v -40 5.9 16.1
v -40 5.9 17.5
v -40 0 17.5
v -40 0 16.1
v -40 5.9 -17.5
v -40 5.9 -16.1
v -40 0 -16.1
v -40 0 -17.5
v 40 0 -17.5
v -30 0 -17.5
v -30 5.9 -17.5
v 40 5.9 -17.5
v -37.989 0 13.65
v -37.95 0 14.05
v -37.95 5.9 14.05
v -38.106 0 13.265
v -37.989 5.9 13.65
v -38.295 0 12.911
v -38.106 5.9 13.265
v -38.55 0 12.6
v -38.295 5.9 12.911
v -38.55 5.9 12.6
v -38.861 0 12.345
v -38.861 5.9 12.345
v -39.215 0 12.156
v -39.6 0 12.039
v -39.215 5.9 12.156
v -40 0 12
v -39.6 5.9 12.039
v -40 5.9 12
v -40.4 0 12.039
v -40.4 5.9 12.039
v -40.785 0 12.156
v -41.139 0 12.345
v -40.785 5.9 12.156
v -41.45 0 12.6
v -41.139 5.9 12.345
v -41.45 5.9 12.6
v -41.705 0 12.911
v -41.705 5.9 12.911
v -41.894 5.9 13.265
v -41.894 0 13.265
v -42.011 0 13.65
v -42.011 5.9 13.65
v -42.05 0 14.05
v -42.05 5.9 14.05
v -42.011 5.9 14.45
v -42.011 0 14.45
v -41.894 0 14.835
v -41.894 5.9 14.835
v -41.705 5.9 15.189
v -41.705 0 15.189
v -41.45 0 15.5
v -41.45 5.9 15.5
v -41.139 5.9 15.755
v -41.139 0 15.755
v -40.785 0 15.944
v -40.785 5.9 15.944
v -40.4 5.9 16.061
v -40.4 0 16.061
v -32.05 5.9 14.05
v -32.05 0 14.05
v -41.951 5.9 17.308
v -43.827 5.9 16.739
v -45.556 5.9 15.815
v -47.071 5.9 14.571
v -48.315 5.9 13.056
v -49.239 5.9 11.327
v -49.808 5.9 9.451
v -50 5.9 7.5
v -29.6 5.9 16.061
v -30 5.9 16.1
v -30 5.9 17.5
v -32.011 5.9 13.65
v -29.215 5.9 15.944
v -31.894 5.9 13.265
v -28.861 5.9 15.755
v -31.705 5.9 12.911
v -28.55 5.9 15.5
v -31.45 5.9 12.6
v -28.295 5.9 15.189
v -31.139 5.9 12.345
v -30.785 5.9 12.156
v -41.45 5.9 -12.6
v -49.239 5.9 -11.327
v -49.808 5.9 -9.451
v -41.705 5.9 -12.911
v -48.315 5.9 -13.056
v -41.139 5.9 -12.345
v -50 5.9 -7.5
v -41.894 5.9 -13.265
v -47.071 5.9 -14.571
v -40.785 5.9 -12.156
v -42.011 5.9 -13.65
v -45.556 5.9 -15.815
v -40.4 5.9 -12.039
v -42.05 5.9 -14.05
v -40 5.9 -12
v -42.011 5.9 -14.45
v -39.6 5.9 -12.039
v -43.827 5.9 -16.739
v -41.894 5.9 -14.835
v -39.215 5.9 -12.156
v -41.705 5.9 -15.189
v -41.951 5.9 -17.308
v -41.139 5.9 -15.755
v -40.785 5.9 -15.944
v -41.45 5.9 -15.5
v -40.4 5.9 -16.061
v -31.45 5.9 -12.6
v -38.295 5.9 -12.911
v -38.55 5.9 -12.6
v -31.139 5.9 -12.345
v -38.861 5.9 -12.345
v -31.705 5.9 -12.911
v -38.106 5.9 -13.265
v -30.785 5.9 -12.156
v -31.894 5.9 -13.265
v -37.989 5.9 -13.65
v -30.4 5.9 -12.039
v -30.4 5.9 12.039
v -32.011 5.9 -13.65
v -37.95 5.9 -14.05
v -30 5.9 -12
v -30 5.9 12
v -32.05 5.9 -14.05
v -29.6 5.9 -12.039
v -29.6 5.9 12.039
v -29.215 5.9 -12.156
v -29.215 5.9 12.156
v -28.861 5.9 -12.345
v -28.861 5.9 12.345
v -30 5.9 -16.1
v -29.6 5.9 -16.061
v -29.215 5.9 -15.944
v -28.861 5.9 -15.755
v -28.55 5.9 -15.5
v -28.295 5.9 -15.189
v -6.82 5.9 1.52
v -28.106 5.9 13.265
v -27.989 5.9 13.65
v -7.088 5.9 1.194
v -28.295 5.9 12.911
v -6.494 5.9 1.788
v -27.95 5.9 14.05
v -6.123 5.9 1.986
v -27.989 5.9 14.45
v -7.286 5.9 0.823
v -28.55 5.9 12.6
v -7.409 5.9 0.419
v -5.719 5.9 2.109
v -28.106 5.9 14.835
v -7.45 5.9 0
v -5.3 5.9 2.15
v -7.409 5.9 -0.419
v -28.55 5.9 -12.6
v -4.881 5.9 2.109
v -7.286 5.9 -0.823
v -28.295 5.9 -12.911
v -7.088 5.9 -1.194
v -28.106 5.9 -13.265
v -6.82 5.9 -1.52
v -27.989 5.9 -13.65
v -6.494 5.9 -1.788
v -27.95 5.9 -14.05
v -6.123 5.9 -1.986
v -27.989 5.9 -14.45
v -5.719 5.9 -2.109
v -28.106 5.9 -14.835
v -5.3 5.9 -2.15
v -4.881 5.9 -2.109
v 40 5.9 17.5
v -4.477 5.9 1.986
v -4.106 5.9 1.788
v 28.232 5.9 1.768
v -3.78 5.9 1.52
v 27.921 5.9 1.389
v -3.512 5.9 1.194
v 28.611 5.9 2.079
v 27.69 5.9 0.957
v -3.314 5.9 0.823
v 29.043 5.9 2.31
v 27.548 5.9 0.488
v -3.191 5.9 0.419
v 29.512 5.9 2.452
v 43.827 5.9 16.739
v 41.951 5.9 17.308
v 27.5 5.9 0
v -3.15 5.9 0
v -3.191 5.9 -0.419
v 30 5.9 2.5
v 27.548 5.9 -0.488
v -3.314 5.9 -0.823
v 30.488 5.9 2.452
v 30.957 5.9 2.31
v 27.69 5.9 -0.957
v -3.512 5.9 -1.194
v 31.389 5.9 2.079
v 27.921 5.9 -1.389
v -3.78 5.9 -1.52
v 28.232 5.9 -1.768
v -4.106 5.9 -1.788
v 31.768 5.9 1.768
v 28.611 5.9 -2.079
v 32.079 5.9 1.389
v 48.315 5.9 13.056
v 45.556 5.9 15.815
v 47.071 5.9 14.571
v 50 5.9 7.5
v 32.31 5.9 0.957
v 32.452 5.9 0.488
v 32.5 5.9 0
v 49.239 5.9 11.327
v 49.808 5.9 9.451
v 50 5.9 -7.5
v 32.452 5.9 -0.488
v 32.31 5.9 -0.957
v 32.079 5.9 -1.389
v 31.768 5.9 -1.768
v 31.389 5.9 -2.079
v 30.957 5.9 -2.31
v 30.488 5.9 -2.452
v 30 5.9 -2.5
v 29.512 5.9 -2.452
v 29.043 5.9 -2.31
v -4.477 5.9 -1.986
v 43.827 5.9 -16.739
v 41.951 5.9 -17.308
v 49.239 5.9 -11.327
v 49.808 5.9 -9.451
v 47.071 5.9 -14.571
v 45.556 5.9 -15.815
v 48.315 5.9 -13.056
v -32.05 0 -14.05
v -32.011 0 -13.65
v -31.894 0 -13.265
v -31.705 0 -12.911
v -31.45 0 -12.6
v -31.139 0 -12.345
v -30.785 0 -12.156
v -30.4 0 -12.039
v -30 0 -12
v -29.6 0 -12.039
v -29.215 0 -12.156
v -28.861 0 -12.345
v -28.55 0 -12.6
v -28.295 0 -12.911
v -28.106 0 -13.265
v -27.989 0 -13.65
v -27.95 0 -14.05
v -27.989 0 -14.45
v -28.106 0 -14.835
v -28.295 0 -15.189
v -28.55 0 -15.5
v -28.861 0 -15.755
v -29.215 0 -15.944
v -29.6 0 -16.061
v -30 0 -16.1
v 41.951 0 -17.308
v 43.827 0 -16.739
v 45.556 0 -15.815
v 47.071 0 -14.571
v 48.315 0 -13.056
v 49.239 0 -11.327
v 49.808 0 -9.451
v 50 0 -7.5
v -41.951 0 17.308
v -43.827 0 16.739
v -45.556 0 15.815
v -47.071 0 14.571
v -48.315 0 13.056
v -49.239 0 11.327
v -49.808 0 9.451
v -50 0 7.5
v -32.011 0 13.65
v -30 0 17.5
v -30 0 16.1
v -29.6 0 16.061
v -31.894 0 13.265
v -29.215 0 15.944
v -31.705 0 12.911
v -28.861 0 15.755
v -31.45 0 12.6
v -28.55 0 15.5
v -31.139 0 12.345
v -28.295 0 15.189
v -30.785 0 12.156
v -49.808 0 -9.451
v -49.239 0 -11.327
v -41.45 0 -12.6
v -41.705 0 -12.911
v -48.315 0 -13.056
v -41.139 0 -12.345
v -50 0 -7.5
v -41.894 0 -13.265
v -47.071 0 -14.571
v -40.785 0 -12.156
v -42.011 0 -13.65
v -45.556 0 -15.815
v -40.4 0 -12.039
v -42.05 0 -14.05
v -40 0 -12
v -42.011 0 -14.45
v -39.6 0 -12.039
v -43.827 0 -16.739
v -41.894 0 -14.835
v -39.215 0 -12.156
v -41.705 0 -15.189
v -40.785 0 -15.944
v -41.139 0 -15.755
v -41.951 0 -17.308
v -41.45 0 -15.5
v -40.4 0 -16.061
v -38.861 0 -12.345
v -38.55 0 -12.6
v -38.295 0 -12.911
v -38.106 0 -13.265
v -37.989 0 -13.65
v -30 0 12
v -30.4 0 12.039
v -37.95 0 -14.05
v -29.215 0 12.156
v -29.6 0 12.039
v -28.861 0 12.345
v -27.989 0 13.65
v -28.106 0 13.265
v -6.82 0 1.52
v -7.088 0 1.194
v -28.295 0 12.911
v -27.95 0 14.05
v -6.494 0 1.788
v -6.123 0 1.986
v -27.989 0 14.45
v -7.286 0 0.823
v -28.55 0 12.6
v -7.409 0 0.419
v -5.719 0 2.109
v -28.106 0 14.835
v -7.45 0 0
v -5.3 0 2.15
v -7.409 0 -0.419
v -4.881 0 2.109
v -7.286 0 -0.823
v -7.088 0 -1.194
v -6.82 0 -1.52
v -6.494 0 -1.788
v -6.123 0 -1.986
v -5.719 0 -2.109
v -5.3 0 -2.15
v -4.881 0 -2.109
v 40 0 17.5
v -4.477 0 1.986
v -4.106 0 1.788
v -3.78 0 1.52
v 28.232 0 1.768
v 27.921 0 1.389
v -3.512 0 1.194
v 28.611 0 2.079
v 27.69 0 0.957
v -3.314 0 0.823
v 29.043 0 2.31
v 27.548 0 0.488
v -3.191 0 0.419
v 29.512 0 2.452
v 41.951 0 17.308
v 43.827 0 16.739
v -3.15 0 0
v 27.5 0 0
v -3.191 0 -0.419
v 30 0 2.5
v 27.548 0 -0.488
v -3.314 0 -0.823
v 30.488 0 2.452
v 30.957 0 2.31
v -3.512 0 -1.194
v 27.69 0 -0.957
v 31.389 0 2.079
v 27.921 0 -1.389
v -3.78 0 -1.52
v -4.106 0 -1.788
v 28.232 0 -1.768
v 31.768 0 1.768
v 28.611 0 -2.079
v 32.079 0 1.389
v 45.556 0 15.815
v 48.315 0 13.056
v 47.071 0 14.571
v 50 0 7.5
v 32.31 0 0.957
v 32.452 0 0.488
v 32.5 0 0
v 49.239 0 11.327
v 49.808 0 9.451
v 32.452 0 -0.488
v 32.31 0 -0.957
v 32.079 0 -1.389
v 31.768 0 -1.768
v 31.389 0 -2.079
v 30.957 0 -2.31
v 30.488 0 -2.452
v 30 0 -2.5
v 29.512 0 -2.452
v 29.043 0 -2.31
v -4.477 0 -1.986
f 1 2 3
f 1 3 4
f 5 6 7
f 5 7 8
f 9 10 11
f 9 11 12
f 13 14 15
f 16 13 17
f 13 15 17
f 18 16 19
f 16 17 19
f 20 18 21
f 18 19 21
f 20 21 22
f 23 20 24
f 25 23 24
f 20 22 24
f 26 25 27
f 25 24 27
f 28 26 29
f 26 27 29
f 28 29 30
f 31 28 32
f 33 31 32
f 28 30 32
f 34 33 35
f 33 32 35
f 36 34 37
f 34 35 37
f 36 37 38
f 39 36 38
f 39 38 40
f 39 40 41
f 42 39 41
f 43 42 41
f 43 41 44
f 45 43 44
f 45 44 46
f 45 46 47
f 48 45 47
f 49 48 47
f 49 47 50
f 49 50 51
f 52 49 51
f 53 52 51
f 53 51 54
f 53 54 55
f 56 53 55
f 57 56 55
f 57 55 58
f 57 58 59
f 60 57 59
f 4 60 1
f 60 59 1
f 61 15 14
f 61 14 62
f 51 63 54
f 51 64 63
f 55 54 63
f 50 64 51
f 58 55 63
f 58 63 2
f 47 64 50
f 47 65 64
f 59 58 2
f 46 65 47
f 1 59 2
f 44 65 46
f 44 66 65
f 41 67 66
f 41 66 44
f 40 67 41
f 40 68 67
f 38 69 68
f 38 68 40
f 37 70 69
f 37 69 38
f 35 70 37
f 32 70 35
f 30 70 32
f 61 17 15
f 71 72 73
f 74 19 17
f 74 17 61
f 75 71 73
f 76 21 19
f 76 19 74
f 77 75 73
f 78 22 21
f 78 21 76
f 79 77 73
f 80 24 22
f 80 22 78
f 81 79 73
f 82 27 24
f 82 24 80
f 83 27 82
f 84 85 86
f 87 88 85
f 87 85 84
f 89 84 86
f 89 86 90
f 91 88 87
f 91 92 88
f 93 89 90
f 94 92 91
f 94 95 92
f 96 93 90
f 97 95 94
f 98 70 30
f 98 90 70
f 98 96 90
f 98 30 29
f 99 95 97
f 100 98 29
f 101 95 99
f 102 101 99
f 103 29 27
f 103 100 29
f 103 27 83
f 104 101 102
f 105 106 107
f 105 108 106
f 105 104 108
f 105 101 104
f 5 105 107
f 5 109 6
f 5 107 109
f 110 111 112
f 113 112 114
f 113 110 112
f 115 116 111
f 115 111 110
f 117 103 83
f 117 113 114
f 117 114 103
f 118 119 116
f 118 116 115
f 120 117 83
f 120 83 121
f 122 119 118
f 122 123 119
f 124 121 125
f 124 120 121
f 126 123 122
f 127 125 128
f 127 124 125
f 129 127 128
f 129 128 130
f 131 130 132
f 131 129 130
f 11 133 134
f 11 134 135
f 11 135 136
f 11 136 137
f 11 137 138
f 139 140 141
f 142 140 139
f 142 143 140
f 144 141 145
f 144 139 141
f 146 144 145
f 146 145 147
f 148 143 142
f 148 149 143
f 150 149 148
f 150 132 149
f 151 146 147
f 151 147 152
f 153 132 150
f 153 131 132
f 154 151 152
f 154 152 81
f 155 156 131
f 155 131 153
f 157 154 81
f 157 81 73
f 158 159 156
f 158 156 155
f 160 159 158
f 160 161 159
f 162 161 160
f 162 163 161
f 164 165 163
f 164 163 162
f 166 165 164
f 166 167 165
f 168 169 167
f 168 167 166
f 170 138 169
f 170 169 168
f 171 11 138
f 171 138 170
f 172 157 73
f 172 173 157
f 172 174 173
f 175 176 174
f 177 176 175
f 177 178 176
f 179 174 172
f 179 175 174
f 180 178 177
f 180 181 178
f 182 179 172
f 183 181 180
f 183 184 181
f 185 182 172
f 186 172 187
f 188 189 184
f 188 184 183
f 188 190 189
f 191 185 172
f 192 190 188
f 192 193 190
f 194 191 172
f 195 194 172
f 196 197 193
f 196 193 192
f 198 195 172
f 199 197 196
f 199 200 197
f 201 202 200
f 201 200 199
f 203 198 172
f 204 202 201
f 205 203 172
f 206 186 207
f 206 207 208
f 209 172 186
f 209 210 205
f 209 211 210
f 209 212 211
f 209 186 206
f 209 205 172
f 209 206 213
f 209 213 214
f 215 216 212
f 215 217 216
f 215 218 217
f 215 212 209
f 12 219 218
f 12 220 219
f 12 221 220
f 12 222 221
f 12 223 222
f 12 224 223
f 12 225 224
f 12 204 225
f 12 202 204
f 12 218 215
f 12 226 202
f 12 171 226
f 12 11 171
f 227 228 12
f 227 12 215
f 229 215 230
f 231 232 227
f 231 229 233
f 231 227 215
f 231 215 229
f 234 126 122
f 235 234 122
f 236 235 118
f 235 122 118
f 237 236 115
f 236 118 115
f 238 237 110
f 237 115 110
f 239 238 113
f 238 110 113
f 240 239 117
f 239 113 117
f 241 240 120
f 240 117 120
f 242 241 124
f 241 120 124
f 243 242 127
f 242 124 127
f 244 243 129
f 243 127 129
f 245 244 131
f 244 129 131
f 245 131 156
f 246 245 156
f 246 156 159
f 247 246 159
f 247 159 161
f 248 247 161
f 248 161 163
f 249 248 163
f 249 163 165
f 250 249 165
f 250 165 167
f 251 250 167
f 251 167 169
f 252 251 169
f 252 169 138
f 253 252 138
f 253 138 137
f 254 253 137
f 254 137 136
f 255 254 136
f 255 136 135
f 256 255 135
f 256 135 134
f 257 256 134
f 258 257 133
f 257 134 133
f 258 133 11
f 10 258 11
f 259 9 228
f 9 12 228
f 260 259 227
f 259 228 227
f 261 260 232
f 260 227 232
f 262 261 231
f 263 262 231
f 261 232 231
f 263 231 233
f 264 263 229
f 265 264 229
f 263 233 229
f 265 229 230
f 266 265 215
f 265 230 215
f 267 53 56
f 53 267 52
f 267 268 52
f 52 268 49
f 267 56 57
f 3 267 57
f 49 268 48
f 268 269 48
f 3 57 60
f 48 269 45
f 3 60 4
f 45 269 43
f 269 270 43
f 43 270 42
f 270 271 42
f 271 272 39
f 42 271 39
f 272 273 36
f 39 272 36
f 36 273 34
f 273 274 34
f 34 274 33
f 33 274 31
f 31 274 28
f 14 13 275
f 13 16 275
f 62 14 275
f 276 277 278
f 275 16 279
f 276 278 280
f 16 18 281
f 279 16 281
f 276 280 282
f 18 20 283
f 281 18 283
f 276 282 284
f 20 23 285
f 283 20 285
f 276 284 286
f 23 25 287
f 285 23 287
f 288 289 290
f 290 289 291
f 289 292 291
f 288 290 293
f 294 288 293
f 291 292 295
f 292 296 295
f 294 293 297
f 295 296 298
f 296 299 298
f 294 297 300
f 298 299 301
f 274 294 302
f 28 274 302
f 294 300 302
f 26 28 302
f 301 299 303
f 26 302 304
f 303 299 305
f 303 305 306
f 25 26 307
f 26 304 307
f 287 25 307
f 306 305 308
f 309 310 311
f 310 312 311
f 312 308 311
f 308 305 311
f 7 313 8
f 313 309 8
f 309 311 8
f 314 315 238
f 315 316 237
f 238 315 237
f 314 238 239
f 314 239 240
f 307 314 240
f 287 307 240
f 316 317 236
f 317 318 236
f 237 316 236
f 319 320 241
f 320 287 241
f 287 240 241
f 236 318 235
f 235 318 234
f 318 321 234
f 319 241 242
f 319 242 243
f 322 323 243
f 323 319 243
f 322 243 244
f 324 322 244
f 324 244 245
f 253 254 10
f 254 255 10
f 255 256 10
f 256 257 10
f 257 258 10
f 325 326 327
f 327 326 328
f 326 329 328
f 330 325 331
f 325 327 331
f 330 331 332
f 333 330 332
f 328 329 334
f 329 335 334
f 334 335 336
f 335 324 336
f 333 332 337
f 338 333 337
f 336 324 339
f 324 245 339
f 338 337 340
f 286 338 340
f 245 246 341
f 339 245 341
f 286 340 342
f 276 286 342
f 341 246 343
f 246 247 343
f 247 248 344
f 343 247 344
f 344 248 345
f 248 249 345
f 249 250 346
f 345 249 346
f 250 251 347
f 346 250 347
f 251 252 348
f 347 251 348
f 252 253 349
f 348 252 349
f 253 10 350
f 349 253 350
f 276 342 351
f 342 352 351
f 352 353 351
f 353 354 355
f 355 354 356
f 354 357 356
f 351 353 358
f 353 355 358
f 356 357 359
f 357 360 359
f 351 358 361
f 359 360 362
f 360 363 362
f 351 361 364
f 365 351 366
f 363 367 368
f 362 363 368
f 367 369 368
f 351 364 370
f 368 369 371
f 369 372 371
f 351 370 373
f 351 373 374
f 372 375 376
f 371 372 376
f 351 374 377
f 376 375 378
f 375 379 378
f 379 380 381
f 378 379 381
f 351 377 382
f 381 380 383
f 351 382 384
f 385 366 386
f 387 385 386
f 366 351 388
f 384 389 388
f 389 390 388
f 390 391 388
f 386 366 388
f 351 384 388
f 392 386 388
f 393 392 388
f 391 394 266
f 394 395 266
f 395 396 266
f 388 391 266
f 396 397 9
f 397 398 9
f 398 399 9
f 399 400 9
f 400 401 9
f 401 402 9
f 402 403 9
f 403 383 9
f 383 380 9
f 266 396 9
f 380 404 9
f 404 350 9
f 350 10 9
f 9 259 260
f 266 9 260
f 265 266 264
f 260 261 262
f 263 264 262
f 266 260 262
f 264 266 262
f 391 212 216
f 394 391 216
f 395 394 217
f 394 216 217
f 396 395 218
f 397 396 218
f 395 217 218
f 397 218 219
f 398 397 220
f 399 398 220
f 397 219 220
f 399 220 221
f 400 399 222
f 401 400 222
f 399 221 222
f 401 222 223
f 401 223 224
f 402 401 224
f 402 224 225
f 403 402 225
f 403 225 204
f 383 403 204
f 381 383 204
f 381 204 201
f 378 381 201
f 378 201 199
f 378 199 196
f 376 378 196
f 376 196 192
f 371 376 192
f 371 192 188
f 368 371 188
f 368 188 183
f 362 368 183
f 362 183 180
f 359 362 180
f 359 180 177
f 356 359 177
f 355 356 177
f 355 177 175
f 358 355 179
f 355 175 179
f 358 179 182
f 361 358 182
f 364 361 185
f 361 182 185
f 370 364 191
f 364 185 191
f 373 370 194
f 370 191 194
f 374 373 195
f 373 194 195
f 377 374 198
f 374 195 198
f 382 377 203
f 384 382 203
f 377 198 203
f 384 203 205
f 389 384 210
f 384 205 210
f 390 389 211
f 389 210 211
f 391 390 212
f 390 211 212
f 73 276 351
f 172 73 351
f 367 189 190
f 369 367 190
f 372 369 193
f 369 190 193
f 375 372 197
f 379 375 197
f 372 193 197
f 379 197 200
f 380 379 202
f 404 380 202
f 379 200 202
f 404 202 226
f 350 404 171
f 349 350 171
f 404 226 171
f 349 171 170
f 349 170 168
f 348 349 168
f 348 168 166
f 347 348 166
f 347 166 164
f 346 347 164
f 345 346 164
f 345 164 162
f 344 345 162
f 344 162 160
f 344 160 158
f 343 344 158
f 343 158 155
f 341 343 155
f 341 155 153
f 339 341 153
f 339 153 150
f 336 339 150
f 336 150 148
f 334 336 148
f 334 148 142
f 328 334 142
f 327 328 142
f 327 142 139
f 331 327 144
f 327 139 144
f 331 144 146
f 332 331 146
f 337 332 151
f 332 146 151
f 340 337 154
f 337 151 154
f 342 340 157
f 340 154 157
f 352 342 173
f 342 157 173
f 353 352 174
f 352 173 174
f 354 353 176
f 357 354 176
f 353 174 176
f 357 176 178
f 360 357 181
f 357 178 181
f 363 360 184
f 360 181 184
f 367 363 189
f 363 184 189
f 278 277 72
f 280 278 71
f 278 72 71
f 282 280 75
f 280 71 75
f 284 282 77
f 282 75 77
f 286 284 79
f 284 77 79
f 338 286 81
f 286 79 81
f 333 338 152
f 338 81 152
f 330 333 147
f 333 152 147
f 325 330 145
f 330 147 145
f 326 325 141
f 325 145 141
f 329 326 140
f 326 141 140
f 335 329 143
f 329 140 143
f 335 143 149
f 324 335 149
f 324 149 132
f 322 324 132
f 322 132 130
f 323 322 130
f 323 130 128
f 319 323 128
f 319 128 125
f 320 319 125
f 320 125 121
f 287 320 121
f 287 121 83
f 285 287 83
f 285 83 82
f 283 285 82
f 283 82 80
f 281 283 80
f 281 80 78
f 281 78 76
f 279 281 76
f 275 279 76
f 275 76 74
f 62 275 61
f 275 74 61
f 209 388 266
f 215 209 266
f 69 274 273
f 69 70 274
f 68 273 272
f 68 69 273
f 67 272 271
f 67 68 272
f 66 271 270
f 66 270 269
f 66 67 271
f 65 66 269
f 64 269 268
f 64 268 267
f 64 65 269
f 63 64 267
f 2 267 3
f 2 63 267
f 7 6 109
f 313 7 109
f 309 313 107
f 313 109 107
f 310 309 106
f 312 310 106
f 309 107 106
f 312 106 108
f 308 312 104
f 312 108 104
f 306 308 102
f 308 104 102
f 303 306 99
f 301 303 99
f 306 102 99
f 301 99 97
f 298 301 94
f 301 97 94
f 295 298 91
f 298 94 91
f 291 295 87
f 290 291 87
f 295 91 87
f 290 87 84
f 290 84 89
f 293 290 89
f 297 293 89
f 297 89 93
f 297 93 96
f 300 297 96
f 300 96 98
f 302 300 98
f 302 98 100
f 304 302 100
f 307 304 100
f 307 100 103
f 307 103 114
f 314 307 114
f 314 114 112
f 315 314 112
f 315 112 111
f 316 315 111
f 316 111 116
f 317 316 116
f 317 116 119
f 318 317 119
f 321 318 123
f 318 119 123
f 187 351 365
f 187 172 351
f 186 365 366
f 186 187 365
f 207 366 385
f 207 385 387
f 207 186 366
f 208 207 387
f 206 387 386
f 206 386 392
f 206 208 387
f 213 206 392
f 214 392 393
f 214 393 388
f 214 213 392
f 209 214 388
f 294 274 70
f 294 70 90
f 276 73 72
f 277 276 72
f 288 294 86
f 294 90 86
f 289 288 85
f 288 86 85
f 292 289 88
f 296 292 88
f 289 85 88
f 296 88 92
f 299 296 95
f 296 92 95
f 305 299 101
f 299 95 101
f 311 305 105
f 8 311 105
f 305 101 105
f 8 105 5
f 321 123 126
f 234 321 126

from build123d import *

# Parameters (mm, degrees)
SKETCH1_W           = 100
SKETCH1_H           = 35
BOSS_EXTRUDE1_DEPTH = 5.9
SKETCH2_R           = 2.5
CUT_EXTRUDE1_DEPTH  = 10
FILLET1_R           = 10
SKETCH4_W           = 10
SKETCH4_H           = 3.45
CUT_EXTRUDE3_DEPTH  = 10
CUT_EXTRUDE5_REACH  = 7.9
SKETCH5_R           = 2.15
CUT_EXTRUDE6_REACH  = 7.9
SKETCH6_R           = 2.05


with BuildPart() as part:
    # Sketch1 → Boss-Extrude1 (new body)
    with BuildSketch(Plane(origin=(0, 0, 0), x_dir=(1, 0, 0), z_dir=(0, 1, 0))):
        Rectangle(SKETCH1_W, SKETCH1_H)
    extrude(amount=BOSS_EXTRUDE1_DEPTH)

    # Sketch2 → Cut-Extrude1 (cut)
    with BuildSketch(Plane(origin=(0, 5.9, 0), x_dir=(1, 0, 0), z_dir=(0, 1, 0))):
        with Locations((30, 0)):
            Circle(SKETCH2_R)
    extrude(amount=-CUT_EXTRUDE1_DEPTH, mode=Mode.SUBTRACT)

    # Fillet1
    fillet1_edges = [part.edges().sort_by_distance(p)[0] for p in [
        (50, 2.95, 17.5),
        (-50, 2.95, 17.5),
        (-50, 2.95, -17.5),
        (50, 2.95, -17.5),
    ]]
    fillet(fillet1_edges, radius=FILLET1_R)

    # Sketch4 → Cut-Extrude3 (cut)
    with BuildSketch(Plane(origin=(0, 5.9, 0), x_dir=(1, 0, 0), z_dir=(0, 1, 0))):
        with Locations((-35, 15.775)):
            Rectangle(SKETCH4_W, SKETCH4_H)
        with Locations((-35, -15.775)):
            Rectangle(SKETCH4_W, SKETCH4_H)
    extrude(amount=-CUT_EXTRUDE3_DEPTH, mode=Mode.SUBTRACT)

    # Sketch5 → Cut-Extrude5 (cut, up to next)
    with BuildSketch(Plane(origin=(0, 5.9, 0), x_dir=(1, 0, 0), z_dir=(0, 1, 0)), mode=Mode.PRIVATE) as cut_extrude5_sk1:
        with Locations((-5.3, 0)):
            Circle(SKETCH5_R)
    cut_extrude5_tool1 = extrude(cut_extrude5_sk1.sketch, amount=-CUT_EXTRUDE5_REACH, mode=Mode.PRIVATE) & part.part
    add(cut_extrude5_tool1.solids().sort_by_distance((-5.3, 5.9, 0))[0], mode=Mode.SUBTRACT)

    # Sketch6 → Cut-Extrude6 (cut, up to next)
    with BuildSketch(Plane(origin=(0, 5.9, 0), x_dir=(1, 0, 0), z_dir=(0, 1, 0)), mode=Mode.PRIVATE) as cut_extrude6_sk1:
        with Locations((-40, 14.05)):
            Circle(SKETCH6_R)
    cut_extrude6_tool1 = extrude(cut_extrude6_sk1.sketch, amount=-CUT_EXTRUDE6_REACH, mode=Mode.PRIVATE) & part.part
    add(cut_extrude6_tool1.solids().sort_by_distance((-40, 5.9, -14.05))[0], mode=Mode.SUBTRACT)
    # Sketch6 → Cut-Extrude6 (cut, up to next)
    with BuildSketch(Plane(origin=(0, 5.9, 0), x_dir=(1, 0, 0), z_dir=(0, 1, 0)), mode=Mode.PRIVATE) as cut_extrude6_sk2:
        with Locations((-30, 14.05)):
            Circle(SKETCH6_R)
    cut_extrude6_tool2 = extrude(cut_extrude6_sk2.sketch, amount=-CUT_EXTRUDE6_REACH, mode=Mode.PRIVATE) & part.part
    add(cut_extrude6_tool2.solids().sort_by_distance((-30, 5.9, -14.05))[0], mode=Mode.SUBTRACT)
    # Sketch6 → Cut-Extrude6 (cut, up to next)
    with BuildSketch(Plane(origin=(0, 5.9, 0), x_dir=(1, 0, 0), z_dir=(0, 1, 0)), mode=Mode.PRIVATE) as cut_extrude6_sk3:
        with Locations((-30, -14.05)):
            Circle(SKETCH6_R)
    cut_extrude6_tool3 = extrude(cut_extrude6_sk3.sketch, amount=-CUT_EXTRUDE6_REACH, mode=Mode.PRIVATE) & part.part
    add(cut_extrude6_tool3.solids().sort_by_distance((-30, 5.9, 14.05))[0], mode=Mode.SUBTRACT)
    # Sketch6 → Cut-Extrude6 (cut, up to next)
    with BuildSketch(Plane(origin=(0, 5.9, 0), x_dir=(1, 0, 0), z_dir=(0, 1, 0)), mode=Mode.PRIVATE) as cut_extrude6_sk4:
        with Locations((-40, -14.05)):
            Circle(SKETCH6_R)
    cut_extrude6_tool4 = extrude(cut_extrude6_sk4.sketch, amount=-CUT_EXTRUDE6_REACH, mode=Mode.PRIVATE) & part.part
    add(cut_extrude6_tool4.solids().sort_by_distance((-40, 5.9, 14.05))[0], mode=Mode.SUBTRACT)


solid = part.part
